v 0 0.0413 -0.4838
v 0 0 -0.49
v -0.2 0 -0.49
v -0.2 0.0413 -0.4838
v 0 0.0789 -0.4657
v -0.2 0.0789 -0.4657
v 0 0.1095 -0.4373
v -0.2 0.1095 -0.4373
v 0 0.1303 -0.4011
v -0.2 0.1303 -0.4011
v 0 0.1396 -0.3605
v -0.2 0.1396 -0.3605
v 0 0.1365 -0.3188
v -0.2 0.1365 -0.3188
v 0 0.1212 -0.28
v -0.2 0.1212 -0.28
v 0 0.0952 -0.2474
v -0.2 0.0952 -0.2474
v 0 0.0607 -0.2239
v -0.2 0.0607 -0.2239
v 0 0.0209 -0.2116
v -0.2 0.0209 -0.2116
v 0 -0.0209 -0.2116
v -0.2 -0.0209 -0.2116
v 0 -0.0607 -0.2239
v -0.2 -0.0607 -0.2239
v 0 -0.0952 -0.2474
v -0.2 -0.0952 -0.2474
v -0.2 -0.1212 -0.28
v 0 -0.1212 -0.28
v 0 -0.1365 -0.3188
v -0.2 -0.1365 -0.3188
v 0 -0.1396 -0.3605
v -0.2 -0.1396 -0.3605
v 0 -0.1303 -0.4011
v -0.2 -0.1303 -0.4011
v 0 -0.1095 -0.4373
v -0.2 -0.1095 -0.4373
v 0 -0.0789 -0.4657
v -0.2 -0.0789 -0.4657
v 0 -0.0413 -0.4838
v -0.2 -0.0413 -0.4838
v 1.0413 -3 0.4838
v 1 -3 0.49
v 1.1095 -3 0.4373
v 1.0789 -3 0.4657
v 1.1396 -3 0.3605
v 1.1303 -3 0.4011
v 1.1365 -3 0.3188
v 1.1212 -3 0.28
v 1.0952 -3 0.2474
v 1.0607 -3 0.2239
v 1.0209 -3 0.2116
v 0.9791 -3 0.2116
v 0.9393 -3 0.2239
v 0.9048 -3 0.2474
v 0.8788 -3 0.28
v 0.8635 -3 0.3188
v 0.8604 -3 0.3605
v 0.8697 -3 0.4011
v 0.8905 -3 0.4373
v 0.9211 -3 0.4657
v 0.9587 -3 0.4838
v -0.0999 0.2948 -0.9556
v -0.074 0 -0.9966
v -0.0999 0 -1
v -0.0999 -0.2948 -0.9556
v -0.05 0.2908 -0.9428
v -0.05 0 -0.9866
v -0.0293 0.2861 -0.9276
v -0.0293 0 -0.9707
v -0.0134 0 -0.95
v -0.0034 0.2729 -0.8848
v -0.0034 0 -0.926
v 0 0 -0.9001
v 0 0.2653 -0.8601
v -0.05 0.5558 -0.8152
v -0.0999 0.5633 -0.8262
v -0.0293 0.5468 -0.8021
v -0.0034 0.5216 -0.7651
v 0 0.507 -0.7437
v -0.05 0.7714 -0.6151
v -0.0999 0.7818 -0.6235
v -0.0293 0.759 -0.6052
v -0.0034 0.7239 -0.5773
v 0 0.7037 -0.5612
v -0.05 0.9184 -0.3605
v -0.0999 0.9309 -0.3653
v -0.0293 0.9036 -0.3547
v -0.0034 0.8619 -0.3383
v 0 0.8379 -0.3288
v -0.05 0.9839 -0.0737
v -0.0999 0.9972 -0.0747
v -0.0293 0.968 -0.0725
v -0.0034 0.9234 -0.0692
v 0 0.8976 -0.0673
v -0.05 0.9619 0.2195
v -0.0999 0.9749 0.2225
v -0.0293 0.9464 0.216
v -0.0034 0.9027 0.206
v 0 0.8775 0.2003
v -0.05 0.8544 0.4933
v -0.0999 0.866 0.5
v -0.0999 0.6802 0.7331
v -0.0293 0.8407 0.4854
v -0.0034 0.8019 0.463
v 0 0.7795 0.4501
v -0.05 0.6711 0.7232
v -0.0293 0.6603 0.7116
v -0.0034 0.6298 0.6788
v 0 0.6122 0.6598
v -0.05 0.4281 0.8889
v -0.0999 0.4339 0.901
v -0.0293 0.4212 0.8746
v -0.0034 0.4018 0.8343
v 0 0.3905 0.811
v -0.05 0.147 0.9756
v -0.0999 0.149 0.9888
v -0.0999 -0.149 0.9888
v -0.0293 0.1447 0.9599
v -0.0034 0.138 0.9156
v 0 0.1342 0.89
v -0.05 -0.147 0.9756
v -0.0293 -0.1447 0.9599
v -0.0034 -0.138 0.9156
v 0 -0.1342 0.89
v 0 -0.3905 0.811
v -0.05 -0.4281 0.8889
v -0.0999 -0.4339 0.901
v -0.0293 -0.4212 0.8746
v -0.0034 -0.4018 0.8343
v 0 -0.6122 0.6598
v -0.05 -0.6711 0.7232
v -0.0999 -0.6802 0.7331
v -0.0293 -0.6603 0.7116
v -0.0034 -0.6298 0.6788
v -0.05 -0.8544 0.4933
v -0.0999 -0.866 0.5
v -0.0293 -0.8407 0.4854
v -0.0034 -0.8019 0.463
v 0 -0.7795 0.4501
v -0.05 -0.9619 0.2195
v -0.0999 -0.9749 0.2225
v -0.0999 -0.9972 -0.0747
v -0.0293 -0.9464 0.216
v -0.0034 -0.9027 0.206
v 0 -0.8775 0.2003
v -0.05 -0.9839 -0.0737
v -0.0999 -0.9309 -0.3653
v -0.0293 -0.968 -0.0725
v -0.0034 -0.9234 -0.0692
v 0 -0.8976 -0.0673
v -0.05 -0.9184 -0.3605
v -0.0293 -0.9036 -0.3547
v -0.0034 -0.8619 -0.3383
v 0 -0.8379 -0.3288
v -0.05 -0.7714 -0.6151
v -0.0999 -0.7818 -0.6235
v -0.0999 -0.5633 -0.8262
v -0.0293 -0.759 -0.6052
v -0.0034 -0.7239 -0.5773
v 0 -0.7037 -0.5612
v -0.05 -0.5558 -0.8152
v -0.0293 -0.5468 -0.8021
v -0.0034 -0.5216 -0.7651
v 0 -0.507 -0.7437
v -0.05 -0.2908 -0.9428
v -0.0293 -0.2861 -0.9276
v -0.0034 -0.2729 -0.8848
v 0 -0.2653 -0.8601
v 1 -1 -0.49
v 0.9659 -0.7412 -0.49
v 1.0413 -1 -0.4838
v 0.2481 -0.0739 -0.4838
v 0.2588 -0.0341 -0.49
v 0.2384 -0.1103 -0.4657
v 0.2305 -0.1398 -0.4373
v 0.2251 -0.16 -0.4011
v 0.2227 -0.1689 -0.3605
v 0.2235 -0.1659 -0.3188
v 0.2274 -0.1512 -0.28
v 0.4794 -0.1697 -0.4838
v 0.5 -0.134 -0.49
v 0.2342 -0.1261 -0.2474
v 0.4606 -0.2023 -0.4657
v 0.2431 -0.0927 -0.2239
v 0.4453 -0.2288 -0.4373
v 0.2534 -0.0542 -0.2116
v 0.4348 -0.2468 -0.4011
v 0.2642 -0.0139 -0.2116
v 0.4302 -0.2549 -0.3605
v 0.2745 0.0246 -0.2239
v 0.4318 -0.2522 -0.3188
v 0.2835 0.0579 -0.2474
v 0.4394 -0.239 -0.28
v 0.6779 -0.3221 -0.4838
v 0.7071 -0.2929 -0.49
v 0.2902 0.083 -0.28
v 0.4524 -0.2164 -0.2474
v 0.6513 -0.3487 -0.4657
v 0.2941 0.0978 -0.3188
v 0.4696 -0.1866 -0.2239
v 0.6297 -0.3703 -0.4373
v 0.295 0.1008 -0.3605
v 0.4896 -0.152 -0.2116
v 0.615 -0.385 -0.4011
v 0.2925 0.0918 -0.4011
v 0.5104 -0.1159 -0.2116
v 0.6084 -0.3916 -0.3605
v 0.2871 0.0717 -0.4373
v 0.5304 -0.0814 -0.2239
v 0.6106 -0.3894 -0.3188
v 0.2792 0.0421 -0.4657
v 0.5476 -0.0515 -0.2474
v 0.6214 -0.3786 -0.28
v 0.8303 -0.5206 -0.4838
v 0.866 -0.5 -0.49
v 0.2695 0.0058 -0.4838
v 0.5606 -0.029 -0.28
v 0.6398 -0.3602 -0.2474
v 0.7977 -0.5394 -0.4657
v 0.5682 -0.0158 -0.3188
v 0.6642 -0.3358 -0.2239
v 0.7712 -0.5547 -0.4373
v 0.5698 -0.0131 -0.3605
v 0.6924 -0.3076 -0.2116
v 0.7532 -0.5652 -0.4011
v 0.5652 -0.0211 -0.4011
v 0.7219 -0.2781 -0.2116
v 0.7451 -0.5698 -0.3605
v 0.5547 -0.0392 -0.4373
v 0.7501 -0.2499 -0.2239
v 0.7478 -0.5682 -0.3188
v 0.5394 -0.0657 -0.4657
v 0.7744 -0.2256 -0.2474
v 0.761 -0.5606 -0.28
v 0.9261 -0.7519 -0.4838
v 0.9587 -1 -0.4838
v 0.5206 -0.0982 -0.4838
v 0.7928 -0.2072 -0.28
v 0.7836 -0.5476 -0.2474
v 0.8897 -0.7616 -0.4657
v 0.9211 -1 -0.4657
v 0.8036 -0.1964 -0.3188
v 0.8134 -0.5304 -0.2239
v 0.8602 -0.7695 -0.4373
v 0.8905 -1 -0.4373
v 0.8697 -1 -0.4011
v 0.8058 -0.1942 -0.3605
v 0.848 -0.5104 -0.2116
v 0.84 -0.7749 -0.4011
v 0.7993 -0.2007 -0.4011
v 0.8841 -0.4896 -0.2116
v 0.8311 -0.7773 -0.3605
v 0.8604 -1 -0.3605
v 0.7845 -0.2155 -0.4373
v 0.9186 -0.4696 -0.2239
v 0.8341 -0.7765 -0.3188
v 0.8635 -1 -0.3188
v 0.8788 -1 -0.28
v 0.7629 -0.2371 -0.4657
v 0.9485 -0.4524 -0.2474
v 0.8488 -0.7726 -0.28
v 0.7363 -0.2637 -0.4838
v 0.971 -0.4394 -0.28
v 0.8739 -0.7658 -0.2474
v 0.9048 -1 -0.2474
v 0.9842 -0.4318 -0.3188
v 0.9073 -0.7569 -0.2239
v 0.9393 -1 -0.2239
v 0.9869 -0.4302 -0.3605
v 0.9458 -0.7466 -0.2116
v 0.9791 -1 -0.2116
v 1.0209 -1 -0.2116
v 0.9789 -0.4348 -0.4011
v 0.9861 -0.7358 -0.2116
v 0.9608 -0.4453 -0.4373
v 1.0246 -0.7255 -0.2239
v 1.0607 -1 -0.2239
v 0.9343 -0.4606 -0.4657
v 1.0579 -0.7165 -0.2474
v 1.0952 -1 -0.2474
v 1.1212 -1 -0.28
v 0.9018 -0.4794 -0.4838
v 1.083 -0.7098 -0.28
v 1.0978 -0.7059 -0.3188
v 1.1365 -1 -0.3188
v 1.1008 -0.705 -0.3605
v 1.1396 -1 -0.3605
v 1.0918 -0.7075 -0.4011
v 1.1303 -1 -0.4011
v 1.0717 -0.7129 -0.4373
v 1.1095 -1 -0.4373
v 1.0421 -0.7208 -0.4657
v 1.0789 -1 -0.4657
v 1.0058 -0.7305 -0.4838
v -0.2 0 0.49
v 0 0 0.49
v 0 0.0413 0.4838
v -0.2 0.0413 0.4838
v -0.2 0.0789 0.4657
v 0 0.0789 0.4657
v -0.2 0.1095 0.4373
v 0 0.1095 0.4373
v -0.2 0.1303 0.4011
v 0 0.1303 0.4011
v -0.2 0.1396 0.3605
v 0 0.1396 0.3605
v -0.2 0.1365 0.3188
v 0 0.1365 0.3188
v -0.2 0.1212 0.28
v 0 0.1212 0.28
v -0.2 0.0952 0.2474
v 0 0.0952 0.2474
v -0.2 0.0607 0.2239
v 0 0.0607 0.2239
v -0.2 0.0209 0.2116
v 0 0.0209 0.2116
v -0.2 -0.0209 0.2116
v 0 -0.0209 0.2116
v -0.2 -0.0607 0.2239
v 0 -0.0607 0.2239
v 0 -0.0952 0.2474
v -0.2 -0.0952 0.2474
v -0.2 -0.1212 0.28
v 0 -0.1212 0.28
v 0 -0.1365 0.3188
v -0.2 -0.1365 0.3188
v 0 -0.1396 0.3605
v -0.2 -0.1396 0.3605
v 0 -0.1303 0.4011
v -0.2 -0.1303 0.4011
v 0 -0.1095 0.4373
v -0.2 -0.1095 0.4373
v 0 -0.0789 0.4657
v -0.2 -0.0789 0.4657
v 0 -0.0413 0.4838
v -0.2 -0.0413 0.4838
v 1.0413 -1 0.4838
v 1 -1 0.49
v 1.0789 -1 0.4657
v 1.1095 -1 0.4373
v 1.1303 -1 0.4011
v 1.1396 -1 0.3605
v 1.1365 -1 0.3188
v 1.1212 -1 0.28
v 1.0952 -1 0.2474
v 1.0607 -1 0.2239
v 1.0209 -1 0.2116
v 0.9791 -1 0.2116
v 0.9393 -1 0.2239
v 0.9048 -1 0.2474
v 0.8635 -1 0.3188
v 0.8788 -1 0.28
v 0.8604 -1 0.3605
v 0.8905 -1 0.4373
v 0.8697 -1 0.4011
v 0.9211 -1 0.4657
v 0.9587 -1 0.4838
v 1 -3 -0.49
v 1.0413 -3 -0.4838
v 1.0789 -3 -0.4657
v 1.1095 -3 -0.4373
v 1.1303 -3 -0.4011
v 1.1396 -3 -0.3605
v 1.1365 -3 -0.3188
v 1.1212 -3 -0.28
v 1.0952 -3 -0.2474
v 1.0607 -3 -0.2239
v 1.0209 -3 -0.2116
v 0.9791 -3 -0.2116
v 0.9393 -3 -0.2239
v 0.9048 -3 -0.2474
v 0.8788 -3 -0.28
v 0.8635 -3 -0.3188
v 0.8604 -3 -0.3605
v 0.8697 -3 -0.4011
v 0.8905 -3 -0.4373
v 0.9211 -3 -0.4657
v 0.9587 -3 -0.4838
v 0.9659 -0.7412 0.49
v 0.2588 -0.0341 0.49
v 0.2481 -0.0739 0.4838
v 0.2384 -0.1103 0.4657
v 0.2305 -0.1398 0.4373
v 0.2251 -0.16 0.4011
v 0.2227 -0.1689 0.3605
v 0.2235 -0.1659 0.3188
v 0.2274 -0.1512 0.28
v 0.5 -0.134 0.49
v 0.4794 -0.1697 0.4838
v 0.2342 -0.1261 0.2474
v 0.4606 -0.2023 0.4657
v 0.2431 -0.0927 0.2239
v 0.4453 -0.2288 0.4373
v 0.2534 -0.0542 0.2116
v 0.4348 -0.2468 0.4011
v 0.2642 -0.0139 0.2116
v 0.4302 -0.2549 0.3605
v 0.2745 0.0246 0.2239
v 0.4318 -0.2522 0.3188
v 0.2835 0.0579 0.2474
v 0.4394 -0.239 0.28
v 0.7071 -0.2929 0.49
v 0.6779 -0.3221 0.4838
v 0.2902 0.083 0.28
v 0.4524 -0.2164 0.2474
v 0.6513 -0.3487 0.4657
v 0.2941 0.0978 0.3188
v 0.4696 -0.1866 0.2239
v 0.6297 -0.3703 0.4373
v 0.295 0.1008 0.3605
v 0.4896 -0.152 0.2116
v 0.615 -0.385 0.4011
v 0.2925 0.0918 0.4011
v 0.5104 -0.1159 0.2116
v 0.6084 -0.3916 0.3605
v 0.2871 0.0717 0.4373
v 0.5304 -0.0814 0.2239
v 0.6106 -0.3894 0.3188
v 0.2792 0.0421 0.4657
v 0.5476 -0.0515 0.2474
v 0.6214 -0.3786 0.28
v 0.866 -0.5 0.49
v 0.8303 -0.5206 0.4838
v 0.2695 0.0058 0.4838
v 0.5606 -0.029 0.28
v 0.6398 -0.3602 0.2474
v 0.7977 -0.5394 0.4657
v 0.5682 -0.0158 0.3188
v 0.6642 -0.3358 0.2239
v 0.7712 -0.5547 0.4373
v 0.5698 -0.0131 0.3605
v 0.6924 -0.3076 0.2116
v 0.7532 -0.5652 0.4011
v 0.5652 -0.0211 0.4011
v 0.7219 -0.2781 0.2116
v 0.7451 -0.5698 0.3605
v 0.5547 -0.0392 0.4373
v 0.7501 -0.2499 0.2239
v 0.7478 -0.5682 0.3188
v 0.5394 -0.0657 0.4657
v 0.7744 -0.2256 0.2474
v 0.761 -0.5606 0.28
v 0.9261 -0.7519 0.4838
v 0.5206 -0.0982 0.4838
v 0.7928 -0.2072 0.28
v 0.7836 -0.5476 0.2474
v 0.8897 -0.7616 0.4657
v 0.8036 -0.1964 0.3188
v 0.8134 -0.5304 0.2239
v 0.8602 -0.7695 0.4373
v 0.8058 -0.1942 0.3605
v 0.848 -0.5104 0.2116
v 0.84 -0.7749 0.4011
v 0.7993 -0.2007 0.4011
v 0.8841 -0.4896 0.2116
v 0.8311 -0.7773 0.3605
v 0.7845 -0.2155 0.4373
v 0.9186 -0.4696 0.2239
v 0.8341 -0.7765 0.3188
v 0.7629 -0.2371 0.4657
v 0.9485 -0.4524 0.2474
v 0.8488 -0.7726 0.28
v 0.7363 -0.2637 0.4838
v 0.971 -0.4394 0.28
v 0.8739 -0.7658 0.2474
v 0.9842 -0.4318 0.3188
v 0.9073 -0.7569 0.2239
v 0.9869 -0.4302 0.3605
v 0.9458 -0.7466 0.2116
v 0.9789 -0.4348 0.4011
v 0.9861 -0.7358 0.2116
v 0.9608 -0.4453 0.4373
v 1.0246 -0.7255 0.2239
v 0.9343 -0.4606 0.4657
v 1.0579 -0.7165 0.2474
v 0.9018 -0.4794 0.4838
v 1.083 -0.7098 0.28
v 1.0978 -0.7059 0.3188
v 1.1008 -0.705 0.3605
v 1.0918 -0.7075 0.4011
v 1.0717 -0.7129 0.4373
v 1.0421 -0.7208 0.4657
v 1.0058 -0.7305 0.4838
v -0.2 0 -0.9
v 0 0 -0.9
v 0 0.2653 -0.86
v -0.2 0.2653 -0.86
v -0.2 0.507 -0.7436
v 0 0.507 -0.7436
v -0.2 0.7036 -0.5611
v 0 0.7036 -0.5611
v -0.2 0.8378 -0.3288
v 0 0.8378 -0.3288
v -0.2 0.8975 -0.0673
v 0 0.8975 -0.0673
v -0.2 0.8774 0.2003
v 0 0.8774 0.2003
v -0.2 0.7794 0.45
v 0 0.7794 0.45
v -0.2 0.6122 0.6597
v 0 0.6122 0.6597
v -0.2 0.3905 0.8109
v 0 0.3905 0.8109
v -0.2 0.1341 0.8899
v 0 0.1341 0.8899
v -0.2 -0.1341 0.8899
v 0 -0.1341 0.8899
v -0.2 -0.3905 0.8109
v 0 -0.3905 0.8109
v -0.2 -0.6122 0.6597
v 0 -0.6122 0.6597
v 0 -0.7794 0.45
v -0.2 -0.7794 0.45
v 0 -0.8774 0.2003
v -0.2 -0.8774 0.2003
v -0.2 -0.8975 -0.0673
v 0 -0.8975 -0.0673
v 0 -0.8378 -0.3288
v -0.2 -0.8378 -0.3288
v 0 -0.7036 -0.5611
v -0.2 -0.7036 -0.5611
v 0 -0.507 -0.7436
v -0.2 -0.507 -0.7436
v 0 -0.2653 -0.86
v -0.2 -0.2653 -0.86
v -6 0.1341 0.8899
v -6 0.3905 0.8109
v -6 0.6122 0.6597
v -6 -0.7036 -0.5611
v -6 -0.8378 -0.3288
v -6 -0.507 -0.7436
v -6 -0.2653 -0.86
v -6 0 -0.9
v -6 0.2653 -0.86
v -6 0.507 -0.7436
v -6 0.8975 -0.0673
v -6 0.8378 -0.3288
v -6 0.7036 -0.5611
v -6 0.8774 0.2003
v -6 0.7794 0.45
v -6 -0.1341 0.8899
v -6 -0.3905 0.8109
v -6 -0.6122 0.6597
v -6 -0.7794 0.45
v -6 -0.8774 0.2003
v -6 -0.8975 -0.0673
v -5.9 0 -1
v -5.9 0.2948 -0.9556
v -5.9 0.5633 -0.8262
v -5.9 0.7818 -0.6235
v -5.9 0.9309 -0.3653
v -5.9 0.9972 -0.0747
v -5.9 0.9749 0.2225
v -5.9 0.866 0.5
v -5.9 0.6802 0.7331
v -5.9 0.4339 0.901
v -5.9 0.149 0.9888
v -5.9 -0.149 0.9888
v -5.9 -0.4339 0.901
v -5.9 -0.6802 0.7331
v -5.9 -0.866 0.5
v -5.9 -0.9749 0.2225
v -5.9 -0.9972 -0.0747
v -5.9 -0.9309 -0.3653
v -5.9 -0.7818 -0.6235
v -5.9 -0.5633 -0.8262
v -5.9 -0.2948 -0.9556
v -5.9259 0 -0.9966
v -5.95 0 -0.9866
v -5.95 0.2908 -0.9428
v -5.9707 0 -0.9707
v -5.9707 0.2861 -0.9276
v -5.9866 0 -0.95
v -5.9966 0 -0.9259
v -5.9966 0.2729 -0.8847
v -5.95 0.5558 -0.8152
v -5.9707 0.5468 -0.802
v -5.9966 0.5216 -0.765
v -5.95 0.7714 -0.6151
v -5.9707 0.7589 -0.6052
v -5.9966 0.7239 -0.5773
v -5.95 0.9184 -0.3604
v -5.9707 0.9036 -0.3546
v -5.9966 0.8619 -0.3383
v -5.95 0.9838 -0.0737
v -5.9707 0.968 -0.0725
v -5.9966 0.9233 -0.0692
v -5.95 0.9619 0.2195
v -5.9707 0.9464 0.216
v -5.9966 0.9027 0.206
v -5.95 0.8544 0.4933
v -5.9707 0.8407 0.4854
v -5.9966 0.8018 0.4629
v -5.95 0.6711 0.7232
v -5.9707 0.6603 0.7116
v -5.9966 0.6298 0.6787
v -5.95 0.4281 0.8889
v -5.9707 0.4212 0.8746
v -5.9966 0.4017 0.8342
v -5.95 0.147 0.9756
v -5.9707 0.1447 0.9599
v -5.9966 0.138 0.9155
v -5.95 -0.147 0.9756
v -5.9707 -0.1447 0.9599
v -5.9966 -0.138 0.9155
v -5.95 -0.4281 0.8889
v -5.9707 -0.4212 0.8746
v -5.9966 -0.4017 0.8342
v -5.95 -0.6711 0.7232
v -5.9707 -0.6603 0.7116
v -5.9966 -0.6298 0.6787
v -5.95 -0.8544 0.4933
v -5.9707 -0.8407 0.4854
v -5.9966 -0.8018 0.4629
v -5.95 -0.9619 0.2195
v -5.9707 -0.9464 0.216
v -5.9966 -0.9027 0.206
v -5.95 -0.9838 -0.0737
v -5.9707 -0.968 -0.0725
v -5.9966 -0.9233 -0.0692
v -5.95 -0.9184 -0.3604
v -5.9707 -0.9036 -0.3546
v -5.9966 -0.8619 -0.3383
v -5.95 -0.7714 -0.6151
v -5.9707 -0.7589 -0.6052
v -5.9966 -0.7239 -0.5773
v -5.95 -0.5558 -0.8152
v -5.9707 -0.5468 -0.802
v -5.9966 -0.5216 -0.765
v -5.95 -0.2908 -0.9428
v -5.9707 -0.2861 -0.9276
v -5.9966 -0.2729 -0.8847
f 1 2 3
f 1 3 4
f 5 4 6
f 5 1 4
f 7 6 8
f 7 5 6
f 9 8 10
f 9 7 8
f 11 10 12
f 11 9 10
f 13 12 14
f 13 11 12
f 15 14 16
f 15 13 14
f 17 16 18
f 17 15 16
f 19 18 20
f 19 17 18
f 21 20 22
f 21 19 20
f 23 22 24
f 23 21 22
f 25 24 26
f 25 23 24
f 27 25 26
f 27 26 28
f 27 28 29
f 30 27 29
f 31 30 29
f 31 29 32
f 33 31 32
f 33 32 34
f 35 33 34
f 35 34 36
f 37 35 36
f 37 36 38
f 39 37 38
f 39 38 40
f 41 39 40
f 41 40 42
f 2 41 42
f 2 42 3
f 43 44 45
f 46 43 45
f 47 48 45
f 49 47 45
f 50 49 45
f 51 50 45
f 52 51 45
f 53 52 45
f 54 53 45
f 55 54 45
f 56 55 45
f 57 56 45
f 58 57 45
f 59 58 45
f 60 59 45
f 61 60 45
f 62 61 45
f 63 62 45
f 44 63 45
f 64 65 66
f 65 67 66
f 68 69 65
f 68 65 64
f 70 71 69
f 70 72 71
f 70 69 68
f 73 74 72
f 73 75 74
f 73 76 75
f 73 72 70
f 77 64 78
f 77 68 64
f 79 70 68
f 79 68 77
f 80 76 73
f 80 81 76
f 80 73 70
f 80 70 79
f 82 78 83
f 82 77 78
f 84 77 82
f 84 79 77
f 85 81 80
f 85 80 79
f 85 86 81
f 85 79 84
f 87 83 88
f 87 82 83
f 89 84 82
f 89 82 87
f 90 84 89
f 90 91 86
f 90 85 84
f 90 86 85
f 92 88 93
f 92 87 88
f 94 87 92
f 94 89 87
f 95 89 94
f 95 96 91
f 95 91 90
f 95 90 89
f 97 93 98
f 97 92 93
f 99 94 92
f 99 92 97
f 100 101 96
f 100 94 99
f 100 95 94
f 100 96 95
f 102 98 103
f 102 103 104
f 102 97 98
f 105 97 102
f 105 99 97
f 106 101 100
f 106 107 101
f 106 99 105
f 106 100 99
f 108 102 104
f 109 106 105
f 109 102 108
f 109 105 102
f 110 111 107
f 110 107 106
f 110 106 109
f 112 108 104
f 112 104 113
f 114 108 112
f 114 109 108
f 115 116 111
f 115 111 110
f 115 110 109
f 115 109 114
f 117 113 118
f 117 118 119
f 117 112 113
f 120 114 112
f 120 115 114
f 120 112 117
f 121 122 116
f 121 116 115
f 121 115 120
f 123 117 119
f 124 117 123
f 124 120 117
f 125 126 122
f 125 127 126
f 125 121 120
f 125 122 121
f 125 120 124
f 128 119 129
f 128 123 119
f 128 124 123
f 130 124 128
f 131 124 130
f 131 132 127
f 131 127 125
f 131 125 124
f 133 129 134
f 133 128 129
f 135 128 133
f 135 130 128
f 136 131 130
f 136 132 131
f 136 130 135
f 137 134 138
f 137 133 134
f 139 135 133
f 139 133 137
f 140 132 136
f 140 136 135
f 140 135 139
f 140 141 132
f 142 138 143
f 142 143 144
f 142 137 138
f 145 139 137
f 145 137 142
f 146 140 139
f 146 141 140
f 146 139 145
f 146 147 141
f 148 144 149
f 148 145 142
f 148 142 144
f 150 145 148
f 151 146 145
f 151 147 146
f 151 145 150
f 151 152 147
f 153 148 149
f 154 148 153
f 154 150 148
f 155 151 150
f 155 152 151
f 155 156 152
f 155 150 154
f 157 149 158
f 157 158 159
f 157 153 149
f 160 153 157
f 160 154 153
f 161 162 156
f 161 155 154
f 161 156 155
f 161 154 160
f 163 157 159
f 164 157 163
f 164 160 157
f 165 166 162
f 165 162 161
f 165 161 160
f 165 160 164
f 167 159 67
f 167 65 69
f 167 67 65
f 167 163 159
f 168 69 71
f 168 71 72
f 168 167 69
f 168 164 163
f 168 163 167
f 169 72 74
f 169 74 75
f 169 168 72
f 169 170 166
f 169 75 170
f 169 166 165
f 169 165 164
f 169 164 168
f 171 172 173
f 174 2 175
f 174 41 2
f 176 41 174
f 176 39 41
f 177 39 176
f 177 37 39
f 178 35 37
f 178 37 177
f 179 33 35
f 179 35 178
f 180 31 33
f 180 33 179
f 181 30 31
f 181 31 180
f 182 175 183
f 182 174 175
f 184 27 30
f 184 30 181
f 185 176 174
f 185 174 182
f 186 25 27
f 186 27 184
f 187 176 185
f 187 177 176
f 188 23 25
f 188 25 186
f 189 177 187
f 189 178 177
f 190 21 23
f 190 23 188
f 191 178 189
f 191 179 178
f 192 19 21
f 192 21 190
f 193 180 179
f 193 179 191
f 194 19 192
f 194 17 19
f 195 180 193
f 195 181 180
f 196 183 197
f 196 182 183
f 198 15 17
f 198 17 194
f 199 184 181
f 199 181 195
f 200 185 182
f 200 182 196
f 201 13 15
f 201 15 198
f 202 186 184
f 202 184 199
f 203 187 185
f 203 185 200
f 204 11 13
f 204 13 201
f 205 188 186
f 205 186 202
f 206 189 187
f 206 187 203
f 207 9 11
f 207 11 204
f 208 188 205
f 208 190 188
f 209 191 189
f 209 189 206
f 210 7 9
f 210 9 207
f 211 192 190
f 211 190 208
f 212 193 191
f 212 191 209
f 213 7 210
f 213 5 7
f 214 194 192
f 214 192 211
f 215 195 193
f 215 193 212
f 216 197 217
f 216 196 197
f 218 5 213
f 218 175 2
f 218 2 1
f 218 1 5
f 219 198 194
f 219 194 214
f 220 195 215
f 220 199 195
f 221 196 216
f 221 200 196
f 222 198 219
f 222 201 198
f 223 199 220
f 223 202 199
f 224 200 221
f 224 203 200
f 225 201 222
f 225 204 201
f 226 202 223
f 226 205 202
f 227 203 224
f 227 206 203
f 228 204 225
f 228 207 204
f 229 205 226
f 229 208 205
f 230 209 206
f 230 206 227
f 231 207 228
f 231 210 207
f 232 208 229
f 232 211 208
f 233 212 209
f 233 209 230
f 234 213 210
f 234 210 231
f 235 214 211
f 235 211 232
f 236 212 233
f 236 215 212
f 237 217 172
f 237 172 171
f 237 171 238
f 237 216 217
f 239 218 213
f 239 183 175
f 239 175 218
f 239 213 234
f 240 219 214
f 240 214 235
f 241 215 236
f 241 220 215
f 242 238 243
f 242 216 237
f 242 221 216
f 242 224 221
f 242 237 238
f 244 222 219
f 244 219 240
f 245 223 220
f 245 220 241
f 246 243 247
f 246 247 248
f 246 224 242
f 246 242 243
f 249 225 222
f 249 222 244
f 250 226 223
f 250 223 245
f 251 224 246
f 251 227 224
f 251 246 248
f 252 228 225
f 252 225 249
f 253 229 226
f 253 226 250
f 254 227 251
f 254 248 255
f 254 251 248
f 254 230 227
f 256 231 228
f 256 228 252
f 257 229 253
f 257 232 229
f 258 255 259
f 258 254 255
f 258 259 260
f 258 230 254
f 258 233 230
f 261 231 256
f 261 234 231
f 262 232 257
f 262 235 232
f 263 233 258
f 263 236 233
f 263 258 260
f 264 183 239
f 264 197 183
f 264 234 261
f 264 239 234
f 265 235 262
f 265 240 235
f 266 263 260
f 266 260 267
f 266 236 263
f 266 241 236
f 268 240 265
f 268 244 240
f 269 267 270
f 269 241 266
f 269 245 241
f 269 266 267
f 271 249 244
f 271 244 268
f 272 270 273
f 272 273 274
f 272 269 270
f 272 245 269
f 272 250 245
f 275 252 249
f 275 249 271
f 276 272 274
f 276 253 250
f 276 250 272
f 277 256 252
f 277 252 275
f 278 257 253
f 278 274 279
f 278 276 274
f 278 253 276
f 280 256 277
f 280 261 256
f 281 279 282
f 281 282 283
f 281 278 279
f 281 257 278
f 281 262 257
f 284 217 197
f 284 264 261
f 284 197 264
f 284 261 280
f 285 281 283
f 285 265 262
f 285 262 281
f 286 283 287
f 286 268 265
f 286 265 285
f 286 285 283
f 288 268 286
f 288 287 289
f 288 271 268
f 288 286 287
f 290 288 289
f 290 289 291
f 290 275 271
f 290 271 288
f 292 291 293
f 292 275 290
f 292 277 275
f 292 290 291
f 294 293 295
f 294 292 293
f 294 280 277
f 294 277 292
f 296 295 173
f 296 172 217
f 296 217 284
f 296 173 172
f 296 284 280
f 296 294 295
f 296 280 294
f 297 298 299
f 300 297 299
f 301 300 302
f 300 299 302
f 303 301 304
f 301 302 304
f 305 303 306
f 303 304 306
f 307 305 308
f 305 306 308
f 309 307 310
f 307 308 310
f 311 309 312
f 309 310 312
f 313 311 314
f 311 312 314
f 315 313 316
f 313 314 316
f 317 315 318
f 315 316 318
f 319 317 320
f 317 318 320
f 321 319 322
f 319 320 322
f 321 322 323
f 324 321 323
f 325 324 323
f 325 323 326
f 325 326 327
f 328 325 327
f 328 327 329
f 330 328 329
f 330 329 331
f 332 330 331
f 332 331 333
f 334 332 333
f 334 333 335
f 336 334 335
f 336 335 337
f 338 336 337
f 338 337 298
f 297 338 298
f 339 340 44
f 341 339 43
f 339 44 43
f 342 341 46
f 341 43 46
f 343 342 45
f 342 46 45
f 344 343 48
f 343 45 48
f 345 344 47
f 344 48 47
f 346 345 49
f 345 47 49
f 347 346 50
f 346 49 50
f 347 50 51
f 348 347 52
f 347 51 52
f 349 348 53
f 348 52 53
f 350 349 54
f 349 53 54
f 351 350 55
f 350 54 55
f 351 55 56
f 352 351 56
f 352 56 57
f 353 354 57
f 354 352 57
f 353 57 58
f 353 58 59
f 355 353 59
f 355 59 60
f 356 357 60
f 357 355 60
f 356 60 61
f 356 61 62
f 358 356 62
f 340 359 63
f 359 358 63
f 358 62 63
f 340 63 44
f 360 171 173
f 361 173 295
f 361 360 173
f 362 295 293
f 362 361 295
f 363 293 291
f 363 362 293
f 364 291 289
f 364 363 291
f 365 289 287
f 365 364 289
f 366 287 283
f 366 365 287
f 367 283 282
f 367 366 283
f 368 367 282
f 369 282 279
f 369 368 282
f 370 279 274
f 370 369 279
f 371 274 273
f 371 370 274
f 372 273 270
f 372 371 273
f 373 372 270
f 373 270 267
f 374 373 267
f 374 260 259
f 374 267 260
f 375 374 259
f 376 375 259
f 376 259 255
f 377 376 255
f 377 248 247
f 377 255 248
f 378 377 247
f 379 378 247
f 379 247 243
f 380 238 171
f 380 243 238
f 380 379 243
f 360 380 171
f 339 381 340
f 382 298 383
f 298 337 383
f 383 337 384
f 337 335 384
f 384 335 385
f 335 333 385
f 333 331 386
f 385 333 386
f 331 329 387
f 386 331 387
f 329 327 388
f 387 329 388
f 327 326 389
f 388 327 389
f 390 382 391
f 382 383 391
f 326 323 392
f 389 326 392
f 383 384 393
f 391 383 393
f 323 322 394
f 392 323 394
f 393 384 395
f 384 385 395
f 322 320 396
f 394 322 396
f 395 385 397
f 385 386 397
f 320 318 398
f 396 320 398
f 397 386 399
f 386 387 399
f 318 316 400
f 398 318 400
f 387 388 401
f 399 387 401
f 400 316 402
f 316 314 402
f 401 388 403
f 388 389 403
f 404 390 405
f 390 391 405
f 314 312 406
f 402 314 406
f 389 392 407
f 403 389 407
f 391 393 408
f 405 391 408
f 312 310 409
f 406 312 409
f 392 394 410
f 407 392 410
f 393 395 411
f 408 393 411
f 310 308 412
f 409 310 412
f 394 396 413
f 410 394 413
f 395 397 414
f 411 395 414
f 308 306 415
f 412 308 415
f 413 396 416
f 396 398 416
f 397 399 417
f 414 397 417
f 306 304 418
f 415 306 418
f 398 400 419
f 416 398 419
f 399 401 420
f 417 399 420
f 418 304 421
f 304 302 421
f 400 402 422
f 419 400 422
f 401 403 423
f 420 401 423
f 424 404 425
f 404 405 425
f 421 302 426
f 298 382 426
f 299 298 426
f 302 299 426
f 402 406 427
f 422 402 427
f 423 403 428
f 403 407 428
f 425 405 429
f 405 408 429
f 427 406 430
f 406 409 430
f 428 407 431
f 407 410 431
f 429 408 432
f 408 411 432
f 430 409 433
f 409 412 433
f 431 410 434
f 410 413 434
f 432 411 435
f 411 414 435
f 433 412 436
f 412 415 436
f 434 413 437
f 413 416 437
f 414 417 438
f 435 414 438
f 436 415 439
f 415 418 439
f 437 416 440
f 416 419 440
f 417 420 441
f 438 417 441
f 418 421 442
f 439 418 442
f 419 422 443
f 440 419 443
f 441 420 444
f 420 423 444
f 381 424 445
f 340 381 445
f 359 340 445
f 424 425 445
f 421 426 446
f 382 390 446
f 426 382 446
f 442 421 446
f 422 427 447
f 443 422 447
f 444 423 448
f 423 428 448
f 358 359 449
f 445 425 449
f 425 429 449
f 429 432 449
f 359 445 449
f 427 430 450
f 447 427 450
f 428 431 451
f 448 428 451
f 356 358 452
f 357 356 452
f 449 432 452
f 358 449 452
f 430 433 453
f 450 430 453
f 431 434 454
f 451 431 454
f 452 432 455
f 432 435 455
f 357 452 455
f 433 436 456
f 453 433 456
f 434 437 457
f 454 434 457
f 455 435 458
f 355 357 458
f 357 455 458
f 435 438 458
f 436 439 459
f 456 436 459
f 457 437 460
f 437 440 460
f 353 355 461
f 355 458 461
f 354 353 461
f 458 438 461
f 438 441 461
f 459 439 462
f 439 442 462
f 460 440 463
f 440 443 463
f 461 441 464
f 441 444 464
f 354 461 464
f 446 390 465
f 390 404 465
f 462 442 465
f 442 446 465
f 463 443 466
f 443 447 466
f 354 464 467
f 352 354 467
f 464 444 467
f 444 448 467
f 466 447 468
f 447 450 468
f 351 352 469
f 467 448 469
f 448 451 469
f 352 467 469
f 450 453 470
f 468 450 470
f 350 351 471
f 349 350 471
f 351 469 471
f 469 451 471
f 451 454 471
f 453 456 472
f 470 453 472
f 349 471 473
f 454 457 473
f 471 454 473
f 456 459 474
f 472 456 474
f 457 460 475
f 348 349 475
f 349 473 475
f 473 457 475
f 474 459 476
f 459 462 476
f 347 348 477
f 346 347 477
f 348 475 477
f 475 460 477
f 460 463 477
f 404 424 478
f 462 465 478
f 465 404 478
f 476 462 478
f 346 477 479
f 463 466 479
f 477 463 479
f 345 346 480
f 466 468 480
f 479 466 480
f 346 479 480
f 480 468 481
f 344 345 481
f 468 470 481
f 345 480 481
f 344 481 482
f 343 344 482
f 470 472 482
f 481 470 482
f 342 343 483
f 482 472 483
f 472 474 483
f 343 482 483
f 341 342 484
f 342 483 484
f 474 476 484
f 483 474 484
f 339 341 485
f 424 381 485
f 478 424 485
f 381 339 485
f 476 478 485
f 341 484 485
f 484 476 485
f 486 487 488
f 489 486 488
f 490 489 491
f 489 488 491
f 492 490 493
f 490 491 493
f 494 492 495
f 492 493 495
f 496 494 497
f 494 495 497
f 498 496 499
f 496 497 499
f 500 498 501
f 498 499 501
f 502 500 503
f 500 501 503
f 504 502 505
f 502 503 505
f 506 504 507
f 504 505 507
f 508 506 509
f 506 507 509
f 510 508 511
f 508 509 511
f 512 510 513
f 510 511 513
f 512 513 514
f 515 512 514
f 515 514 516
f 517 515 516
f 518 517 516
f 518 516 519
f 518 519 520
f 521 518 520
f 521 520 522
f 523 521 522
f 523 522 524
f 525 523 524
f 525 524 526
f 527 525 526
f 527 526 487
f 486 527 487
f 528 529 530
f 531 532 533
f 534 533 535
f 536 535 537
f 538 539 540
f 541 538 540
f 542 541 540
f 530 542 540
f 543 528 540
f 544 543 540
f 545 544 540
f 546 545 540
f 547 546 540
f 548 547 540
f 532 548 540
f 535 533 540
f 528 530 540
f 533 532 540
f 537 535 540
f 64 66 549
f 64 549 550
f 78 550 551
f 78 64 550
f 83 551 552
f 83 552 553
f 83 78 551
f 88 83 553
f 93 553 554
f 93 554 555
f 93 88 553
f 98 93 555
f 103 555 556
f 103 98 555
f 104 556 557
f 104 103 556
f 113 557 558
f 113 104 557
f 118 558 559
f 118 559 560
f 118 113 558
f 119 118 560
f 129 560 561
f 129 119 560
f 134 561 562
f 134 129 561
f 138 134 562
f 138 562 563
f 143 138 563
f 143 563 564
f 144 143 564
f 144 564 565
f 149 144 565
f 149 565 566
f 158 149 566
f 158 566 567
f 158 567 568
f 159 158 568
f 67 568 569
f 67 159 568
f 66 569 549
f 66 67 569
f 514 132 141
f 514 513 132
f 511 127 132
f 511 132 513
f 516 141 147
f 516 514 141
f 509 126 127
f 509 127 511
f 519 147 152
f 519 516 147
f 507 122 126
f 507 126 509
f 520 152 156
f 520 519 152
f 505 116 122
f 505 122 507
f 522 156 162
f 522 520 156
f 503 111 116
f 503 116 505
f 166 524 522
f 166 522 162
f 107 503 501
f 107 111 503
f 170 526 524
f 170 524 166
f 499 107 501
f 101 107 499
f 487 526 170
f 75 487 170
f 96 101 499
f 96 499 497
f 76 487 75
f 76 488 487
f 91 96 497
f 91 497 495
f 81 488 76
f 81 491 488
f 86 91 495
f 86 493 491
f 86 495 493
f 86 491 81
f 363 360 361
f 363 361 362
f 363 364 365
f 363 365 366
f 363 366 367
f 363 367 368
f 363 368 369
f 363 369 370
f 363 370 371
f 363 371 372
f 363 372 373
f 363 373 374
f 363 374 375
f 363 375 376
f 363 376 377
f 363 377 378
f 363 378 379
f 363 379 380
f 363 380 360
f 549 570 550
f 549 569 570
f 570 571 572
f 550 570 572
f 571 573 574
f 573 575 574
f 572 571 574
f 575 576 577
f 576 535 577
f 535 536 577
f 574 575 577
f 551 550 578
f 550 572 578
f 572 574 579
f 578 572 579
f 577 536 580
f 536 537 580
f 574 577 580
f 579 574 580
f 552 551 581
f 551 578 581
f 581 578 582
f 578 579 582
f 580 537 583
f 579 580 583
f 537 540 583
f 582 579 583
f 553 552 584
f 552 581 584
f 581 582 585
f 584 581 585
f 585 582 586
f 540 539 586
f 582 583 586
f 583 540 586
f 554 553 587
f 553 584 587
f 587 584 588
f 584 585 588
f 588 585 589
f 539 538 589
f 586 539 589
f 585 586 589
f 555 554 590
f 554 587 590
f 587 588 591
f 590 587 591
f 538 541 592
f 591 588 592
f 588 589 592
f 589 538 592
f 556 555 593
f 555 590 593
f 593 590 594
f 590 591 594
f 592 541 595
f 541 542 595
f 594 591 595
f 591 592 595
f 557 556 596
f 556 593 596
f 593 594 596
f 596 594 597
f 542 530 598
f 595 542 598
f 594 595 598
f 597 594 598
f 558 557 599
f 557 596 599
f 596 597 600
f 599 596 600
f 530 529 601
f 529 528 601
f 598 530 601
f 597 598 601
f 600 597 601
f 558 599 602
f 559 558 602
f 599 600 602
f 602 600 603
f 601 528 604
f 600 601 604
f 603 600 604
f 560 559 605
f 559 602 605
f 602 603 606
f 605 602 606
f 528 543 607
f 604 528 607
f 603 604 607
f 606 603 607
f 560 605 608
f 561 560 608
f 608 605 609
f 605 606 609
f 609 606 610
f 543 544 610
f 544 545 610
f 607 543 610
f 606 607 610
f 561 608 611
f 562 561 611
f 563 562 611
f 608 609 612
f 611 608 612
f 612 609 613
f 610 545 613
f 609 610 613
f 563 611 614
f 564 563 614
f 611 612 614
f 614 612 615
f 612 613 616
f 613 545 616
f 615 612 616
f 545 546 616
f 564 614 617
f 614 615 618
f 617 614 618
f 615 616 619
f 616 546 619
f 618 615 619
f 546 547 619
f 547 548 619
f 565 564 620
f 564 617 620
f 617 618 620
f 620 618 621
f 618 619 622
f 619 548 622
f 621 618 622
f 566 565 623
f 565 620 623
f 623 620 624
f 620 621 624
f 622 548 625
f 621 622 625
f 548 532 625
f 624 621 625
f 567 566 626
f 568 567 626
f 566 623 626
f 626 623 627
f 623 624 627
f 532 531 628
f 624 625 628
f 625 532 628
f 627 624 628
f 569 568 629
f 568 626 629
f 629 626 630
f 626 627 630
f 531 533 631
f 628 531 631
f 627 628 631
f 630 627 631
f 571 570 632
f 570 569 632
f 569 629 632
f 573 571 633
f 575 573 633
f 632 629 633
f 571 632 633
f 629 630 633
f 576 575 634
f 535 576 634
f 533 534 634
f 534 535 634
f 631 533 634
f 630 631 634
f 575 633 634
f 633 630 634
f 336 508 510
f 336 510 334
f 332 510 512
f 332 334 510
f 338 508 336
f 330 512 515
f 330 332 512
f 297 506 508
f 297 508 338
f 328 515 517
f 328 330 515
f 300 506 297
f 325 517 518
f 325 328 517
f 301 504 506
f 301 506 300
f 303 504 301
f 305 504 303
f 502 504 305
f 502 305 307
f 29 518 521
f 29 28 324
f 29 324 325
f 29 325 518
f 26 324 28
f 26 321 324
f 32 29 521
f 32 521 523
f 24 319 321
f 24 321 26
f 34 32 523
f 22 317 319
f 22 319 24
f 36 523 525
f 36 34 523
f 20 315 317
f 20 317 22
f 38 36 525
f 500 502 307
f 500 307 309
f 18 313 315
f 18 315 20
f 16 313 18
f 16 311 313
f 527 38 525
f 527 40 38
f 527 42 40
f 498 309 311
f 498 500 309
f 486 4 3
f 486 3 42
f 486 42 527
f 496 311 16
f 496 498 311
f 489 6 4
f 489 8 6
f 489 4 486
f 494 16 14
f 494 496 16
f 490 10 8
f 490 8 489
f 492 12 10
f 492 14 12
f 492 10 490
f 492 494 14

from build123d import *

# Parameters (mm, degrees)
SKETCH_1_R          = 1
EXTRUDE_1_DEPTH     = 6
SKETCH_2_R          = 0.9
CUT_EXTRUDE_1_DEPTH = 5.8
SKETCH_5_R          = 0.9
EXTRUDE_4_DEPTH     = 5.6
SKETCH_7_R          = 0.14
FILLET_1_R          = 0.1
FILLET_2_R          = 0.1


with BuildPart() as part:
    # 草图1 → 凸台-拉伸1 (new body)
    with BuildSketch(Plane(origin=(0, 0, 0), x_dir=(0, 0, -1), z_dir=(1, 0, 0))):
        Circle(SKETCH_1_R)
    extrude(amount=-EXTRUDE_1_DEPTH)

    # 草图2 → 切除-拉伸1 (cut)
    with BuildSketch(Plane(origin=(0, 0, 0), x_dir=(0, 0, -1), z_dir=(1, 0, 0))):
        Circle(SKETCH_2_R)
    extrude(amount=-CUT_EXTRUDE_1_DEPTH, mode=Mode.SUBTRACT)



with BuildPart() as body_2:
    # 草图5 → 凸台-拉伸4 (new body)
    with BuildSketch(Plane(origin=(-5.8, 0, 0), x_dir=(0, 0, -1), z_dir=(1, 0, 0))):
        Circle(SKETCH_5_R)
    extrude(amount=EXTRUDE_4_DEPTH)


with BuildPart() as part_1:
    add(part.part)

    add(body_2.part)  # 扫描1 merges body 2
    # 扫描1: sweep along a curve in space
    with BuildLine() as sweep_1_path:
        Line((-0.2, 0, -0.35), (0, 0, -0.35))
        ThreePointArc((0, 0, -0.35), (0.707106781, -0.292893219, -0.35), (1, -1, -0.35))
        Line((1, -1, -0.35), (1, -3, -0.35))
    # 草图7 → 扫描1 (sweep)
    with BuildSketch(Plane(origin=(-0.2, 0, 0), x_dir=(0, 0, -1), z_dir=(1, 0, 0))):
        with Locations((0.35, 0)):
            Circle(SKETCH_7_R)
    sweep_1 = sweep(path=sweep_1_path.line)

    # 镜向1: 扫描1 across plane
    add(sweep_1.mirror(Plane.XY))

    # 圆角1
    fillet_1_edges = [part_1.edges().sort_by_distance(p)[0] for p in [
        (-6, 0, 1),
    ]]
    fillet(fillet_1_edges, radius=FILLET_1_R)

    # 圆角2
    fillet_2_edges = [part_1.edges().sort_by_distance(p)[0] for p in [
        (0, 0, 1),
    ]]
    fillet(fillet_2_edges, radius=FILLET_2_R - 0.0001)  # a hair under: the kernel refuses the full size


solid = part_1.part
